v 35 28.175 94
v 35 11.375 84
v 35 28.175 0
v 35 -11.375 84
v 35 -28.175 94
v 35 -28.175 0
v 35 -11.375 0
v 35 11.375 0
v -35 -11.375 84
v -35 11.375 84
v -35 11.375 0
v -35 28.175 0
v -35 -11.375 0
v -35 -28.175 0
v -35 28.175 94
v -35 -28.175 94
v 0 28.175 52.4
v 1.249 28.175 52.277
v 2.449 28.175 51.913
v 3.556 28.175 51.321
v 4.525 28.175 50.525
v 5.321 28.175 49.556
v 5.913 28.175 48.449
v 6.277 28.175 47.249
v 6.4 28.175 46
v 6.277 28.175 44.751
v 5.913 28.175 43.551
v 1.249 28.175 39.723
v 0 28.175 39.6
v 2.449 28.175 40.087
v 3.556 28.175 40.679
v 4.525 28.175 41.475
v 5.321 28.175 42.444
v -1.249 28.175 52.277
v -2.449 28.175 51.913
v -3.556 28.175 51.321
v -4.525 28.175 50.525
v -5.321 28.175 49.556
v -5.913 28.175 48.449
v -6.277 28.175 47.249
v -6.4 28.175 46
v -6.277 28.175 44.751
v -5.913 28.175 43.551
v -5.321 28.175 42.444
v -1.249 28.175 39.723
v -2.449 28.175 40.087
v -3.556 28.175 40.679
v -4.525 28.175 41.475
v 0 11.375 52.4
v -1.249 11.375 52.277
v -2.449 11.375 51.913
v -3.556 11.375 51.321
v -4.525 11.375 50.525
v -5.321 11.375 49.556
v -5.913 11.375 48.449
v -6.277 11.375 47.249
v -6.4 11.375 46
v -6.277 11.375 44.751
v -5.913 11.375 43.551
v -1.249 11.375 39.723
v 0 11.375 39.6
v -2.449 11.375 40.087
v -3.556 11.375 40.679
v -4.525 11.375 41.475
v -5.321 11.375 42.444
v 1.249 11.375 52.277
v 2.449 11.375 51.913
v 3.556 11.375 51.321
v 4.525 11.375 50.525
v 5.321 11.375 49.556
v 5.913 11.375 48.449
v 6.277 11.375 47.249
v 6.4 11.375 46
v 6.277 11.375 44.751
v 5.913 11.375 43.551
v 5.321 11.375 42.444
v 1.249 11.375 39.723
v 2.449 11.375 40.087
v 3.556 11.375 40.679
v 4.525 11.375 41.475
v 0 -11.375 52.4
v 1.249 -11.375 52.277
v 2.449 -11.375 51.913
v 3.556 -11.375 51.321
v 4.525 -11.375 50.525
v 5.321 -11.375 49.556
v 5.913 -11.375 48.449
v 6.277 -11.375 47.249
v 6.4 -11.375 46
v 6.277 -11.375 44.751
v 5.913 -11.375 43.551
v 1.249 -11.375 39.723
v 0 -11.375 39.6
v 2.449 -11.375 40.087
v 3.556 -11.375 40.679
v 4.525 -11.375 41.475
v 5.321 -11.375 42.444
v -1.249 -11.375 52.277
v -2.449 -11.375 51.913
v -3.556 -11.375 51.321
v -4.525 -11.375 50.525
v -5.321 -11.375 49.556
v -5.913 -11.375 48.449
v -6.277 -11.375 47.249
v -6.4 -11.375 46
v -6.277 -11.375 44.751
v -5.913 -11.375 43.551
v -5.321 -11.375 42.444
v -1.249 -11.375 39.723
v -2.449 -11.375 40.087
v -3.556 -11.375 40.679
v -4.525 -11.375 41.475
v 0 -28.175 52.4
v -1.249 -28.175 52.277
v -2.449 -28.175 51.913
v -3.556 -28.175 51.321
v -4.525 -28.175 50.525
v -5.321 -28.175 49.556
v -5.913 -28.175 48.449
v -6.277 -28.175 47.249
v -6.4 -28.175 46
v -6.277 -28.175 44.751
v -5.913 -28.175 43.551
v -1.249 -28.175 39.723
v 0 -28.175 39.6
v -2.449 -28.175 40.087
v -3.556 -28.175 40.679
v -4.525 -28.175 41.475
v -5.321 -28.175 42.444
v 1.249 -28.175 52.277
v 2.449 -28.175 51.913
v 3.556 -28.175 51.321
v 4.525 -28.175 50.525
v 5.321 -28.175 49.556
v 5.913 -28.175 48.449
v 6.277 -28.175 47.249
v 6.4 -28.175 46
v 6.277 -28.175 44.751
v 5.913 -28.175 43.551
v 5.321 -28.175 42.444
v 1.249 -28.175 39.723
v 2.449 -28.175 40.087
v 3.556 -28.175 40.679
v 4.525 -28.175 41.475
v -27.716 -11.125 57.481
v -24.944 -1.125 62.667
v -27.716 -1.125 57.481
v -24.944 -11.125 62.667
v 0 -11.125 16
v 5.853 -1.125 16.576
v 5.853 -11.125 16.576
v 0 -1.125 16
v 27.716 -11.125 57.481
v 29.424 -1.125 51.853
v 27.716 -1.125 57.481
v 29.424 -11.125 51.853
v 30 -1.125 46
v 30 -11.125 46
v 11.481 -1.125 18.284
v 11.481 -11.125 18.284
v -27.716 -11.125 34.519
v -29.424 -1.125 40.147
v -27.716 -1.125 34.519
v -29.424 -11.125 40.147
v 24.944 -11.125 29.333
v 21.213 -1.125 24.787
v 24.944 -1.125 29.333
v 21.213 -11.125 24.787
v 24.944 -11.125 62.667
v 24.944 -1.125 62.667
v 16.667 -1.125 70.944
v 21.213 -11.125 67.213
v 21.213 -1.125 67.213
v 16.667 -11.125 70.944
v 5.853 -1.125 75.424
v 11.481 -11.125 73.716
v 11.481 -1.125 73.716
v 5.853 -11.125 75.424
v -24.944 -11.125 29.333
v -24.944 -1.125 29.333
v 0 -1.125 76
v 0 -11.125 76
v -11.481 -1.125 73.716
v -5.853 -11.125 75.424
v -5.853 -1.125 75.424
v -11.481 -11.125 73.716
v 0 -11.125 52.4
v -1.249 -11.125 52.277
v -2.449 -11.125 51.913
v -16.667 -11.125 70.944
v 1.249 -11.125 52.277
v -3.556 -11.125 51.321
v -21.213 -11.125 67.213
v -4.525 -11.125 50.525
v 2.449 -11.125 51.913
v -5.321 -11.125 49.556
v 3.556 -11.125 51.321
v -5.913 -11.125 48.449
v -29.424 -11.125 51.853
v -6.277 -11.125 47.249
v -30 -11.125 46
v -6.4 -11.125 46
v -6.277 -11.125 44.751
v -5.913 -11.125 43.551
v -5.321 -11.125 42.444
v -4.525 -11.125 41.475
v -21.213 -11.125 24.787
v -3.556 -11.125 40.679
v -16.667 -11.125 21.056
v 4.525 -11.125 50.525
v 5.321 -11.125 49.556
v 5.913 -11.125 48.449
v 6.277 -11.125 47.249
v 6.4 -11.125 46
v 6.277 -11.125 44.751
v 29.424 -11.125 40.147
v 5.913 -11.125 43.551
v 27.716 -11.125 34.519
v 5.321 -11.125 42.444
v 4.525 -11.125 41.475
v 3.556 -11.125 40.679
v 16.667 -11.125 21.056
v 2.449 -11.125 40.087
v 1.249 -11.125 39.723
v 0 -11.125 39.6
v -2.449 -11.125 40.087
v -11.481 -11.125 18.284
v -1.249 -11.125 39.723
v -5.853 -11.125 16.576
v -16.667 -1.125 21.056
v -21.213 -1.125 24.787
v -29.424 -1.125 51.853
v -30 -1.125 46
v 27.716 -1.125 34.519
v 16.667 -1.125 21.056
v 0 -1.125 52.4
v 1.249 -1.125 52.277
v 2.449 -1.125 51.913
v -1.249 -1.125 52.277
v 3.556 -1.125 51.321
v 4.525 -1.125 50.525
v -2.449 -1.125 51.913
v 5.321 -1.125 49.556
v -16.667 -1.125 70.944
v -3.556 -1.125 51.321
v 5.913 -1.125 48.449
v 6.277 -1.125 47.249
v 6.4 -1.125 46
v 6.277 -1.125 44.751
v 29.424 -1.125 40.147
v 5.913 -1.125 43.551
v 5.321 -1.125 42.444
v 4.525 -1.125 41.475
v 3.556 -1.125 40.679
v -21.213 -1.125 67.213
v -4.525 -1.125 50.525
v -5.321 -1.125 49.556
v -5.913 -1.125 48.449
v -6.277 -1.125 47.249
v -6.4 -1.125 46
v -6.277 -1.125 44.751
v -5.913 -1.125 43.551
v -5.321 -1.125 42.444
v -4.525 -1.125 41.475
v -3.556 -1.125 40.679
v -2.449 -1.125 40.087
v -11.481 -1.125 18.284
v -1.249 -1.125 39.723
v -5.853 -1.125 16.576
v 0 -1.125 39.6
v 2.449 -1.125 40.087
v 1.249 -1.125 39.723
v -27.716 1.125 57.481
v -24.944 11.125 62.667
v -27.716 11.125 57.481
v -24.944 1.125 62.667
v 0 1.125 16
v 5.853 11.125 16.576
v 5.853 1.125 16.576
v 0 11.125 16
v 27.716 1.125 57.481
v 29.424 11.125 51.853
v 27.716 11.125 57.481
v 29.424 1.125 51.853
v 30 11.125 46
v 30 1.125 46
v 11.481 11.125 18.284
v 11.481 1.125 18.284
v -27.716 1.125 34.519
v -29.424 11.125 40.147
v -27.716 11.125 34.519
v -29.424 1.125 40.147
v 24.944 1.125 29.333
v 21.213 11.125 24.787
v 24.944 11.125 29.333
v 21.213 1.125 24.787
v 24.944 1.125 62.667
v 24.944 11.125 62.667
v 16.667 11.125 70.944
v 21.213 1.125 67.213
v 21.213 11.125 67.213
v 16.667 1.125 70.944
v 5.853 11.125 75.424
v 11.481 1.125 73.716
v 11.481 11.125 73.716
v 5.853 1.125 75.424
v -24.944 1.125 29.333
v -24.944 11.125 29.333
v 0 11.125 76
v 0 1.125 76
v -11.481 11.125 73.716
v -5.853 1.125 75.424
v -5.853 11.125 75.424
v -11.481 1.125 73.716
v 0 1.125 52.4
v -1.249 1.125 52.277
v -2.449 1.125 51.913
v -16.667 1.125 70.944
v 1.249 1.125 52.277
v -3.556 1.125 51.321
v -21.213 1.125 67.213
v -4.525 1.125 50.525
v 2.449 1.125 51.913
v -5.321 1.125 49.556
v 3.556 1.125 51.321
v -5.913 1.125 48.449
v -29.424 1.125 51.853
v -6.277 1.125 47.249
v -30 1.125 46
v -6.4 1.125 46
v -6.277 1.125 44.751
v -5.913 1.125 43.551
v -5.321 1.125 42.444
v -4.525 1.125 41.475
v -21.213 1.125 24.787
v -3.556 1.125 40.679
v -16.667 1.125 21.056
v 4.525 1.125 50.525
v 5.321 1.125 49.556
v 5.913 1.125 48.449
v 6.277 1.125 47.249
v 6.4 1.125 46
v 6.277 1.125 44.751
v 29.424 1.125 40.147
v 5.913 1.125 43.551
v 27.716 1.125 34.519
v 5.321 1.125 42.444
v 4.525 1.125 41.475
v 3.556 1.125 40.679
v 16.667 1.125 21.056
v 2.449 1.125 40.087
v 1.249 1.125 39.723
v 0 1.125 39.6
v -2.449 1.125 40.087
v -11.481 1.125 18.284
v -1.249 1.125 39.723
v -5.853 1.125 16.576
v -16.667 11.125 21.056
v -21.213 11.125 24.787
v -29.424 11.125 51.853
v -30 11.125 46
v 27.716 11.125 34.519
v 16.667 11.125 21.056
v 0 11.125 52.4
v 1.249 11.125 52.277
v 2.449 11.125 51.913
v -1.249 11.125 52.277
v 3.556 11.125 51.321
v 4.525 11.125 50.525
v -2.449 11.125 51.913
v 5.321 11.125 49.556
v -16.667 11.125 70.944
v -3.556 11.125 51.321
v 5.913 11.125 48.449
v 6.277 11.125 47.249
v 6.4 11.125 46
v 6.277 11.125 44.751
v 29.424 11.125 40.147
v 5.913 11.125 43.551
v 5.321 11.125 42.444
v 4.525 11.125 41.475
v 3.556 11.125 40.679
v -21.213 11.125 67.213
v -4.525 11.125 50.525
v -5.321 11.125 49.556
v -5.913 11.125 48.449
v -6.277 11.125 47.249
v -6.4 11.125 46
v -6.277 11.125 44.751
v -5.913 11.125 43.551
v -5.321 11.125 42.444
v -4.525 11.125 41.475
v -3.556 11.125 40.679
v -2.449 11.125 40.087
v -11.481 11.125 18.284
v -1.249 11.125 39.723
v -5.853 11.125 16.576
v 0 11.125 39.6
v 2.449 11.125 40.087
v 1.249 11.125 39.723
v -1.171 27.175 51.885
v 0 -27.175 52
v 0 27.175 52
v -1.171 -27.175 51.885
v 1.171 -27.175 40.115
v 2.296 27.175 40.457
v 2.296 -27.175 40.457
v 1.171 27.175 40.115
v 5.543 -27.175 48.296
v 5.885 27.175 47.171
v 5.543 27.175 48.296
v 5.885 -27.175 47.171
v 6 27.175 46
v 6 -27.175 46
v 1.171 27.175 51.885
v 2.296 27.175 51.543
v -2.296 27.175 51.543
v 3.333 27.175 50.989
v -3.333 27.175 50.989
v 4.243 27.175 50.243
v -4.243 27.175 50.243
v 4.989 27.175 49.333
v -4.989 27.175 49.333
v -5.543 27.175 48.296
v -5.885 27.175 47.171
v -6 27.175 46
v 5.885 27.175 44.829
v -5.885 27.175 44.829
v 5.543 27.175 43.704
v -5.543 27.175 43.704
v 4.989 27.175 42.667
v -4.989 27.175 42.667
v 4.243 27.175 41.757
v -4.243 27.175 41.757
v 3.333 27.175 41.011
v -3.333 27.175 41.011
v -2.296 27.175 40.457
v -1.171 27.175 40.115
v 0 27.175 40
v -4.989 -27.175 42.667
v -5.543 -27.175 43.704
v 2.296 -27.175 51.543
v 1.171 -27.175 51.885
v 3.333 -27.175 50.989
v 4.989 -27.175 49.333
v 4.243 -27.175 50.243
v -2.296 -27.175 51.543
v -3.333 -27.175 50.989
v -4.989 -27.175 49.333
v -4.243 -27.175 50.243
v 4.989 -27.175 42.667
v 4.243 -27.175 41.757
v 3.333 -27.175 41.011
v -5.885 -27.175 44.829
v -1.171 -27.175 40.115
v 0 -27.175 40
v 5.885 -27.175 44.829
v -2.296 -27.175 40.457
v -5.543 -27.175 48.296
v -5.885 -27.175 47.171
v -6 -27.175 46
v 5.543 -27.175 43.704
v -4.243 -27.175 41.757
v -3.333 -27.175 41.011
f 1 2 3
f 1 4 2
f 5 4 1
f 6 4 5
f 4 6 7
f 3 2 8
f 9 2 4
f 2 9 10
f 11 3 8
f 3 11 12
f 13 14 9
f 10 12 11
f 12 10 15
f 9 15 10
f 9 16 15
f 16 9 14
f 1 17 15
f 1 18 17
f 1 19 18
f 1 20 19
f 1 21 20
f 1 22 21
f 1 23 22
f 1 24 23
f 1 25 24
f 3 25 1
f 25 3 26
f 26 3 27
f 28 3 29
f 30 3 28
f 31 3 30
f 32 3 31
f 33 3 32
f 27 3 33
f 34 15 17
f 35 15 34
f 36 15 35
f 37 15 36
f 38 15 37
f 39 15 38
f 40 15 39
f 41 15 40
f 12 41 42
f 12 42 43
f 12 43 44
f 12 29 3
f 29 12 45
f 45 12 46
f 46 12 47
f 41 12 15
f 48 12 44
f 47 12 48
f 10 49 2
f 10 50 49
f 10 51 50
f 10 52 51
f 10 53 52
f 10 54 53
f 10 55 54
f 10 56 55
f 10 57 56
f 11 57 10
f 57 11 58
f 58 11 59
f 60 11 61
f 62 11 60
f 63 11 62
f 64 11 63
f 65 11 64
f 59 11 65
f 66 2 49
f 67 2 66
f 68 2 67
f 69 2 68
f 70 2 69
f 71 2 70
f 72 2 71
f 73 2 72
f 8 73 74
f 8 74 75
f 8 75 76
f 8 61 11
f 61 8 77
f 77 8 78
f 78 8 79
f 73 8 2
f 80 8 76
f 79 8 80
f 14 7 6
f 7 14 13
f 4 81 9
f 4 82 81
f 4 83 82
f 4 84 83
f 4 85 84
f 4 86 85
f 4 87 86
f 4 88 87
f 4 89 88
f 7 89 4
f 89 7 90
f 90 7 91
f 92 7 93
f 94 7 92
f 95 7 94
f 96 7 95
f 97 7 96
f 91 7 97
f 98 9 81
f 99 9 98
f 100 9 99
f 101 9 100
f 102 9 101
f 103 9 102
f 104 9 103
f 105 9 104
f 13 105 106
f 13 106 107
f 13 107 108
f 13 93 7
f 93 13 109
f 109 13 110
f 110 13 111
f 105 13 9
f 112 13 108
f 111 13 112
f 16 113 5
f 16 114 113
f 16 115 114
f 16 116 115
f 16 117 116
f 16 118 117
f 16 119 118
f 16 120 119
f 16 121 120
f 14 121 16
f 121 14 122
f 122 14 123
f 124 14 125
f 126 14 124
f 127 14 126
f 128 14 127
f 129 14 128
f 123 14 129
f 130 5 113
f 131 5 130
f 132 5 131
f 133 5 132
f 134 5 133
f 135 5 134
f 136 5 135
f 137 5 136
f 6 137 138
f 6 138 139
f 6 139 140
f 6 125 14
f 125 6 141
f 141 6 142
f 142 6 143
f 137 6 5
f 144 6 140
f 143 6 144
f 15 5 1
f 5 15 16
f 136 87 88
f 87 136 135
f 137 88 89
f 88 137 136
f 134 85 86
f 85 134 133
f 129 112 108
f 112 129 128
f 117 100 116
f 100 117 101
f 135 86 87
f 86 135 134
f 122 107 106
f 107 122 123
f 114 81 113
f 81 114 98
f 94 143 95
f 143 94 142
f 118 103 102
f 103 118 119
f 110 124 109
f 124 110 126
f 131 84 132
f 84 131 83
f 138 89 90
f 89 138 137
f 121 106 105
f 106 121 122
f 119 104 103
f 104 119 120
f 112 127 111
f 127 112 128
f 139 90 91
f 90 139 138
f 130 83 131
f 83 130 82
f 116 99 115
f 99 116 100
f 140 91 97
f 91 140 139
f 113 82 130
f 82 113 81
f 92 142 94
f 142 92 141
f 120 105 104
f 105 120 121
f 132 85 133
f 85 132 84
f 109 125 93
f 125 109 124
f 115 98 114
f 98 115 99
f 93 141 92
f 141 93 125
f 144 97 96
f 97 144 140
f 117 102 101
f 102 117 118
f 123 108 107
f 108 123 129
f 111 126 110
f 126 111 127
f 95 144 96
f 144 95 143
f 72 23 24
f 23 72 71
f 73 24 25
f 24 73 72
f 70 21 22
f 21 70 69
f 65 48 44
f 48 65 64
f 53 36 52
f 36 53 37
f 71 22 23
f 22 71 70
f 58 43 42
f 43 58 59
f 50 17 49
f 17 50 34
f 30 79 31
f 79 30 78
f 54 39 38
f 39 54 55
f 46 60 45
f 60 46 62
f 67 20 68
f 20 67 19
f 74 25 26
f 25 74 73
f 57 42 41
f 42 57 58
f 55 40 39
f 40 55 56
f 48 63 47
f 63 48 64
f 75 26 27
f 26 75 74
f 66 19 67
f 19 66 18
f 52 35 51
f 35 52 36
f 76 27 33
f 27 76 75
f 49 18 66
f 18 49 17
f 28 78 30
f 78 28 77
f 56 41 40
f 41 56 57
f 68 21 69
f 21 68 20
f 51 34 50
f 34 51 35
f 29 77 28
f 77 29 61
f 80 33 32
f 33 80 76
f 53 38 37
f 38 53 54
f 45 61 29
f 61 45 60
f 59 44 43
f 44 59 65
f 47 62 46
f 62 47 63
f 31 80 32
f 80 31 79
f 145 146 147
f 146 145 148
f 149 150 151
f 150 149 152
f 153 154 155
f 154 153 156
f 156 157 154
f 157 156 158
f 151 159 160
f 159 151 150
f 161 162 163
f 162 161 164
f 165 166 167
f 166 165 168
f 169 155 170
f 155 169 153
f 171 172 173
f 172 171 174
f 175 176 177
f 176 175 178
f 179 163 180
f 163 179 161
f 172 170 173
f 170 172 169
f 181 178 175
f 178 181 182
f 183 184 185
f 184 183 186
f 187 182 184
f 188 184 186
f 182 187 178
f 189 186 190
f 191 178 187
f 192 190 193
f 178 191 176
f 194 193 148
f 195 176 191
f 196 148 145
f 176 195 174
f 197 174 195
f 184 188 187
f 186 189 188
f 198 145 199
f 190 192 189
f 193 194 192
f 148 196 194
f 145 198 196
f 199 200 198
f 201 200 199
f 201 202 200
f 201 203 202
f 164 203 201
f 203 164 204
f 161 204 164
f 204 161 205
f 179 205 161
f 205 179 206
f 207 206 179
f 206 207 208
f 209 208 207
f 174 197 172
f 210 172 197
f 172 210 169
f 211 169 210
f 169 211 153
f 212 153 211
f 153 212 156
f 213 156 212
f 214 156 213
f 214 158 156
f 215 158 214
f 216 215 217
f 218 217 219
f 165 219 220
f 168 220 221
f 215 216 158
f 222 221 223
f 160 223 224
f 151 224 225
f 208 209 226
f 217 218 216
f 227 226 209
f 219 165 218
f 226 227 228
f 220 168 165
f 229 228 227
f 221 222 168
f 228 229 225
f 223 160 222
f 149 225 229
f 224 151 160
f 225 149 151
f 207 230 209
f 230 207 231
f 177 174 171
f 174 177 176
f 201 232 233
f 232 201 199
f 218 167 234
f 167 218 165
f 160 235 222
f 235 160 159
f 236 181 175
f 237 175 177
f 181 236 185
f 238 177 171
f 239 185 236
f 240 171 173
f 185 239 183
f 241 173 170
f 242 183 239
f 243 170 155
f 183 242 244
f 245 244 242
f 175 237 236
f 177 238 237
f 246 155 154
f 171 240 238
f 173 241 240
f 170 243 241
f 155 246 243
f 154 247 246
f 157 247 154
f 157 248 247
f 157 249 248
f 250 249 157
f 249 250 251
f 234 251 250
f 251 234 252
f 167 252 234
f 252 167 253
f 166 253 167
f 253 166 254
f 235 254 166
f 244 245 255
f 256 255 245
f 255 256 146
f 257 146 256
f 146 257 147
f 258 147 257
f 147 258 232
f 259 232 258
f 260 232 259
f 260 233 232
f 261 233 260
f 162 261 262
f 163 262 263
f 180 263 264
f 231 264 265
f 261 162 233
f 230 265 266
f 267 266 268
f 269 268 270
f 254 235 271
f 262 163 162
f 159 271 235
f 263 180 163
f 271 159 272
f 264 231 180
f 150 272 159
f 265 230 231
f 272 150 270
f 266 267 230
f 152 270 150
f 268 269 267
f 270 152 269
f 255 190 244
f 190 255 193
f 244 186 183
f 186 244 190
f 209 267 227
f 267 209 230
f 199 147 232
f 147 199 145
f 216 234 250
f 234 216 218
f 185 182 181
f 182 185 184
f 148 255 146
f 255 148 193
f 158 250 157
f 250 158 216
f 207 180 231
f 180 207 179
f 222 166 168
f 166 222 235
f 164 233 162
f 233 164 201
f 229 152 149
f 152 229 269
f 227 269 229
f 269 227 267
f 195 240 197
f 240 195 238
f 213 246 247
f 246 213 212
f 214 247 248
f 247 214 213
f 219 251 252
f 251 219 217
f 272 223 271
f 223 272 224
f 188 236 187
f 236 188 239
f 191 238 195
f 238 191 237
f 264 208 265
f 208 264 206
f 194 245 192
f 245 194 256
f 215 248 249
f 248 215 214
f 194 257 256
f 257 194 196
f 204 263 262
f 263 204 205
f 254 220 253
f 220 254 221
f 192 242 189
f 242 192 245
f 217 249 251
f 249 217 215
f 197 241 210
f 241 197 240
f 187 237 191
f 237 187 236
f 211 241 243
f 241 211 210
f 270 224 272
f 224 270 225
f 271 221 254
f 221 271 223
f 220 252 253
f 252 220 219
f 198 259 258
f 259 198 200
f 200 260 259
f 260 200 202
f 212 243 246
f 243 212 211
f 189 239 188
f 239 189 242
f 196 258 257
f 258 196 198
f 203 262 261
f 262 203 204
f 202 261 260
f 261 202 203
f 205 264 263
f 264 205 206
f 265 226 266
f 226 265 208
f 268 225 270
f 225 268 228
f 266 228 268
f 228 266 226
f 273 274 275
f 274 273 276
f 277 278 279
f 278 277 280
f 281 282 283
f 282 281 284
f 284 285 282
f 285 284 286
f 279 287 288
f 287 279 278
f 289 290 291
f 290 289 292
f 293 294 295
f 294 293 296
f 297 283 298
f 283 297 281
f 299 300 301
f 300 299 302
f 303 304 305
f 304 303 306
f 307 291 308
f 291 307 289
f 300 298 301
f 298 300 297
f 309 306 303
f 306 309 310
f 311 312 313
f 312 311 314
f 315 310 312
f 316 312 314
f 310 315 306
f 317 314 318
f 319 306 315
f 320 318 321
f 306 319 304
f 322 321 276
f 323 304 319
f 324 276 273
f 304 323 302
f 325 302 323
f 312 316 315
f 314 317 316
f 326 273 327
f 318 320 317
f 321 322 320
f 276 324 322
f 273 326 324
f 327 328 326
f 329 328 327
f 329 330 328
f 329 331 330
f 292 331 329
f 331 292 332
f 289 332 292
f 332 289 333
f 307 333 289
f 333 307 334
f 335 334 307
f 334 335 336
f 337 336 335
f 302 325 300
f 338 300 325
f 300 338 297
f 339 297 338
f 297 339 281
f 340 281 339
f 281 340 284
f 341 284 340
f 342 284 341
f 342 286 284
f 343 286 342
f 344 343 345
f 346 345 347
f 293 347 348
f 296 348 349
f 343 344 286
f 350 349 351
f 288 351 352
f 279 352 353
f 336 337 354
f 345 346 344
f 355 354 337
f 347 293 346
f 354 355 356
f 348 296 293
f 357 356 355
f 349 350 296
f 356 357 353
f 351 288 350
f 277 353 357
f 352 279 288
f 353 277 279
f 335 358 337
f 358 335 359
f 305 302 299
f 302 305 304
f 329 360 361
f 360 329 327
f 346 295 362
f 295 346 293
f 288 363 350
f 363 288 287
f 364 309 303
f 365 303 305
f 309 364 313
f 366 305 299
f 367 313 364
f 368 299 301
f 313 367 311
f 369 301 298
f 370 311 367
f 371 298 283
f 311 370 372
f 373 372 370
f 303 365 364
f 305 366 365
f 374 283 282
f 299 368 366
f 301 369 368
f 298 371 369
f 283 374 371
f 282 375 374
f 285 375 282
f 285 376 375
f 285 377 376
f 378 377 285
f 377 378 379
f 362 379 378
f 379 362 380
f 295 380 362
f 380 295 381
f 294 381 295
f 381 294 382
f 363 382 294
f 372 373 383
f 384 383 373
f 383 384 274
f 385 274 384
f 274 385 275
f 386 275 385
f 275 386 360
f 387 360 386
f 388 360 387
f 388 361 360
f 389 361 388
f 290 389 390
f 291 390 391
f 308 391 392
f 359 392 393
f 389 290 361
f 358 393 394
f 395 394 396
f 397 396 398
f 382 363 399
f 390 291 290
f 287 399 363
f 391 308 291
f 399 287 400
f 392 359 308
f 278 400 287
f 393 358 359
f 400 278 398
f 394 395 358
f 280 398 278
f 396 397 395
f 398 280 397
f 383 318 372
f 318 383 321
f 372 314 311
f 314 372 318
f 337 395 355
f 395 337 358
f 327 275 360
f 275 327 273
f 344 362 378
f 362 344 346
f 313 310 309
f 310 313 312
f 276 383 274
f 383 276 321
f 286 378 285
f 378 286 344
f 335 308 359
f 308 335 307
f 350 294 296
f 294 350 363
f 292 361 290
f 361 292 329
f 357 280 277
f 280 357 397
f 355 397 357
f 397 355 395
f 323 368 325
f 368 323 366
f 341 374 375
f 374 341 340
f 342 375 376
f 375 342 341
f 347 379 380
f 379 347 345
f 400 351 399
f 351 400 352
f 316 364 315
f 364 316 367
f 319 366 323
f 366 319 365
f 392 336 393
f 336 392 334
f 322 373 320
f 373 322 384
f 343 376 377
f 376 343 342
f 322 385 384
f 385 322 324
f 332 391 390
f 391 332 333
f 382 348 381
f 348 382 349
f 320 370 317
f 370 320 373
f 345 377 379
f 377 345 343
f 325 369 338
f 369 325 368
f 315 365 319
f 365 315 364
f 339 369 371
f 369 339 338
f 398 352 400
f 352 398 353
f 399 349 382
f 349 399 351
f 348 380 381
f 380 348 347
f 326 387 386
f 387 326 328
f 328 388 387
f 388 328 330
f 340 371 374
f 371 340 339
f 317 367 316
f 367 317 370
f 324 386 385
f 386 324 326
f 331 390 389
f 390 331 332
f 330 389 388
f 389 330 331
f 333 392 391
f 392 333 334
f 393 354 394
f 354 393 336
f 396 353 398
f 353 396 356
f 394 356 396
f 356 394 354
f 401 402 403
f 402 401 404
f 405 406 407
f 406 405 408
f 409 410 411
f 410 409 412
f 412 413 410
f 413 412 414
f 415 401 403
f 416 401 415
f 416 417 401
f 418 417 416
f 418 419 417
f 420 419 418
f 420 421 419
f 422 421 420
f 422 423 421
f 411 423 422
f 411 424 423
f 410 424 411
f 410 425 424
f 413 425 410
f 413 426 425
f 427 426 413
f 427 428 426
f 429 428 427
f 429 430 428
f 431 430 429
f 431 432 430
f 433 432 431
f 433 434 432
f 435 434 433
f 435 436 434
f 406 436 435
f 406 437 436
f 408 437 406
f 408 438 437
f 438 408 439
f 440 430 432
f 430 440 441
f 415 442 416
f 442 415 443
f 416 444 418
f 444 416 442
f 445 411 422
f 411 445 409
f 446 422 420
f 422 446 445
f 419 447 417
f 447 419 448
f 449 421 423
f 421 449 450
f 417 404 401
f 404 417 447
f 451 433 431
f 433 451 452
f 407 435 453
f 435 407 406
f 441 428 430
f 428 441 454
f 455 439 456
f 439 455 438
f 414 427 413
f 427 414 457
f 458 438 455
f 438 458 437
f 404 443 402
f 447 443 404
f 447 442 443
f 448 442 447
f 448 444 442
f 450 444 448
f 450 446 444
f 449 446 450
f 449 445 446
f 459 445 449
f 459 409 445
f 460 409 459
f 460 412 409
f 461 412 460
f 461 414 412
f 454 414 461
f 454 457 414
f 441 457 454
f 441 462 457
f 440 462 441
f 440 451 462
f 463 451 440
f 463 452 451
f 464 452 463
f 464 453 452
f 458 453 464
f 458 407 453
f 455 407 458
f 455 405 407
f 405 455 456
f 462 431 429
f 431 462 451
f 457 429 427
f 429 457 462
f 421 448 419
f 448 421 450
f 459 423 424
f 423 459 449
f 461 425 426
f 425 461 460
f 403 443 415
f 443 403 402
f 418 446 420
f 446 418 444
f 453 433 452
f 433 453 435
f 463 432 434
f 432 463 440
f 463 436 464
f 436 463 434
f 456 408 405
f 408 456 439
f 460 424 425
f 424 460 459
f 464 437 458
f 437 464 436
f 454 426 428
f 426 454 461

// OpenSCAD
$fn = 32;

// ------------------------------------------------------------------------
// Trolley wheel set: wheels d60, fork 84 mm tall
// Every part is its own module, assembly() places every instance.
// ------------------------------------------------------------------------

// --- part 1 ---
module trolley_fork() {
  difference() {
    union() {
      translate([-35, 11.375, 0]) cube([70, 16.8, 84]);
      translate([-35, -28.175, 0]) cube([70, 16.8, 84]);
      translate([-35, -28.175, 84]) cube([70, 56.35, 10]);
    }
    translate([0, -19.775, 46]) rotate([90, 0, 0]) cylinder(h = 18.8, d = 12.8, center = true);
    translate([0, 19.775, 46]) rotate([90, 0, 0]) cylinder(h = 18.8, d = 12.8, center = true);
  }
}

// --- part 2 ---
module trolley_wheel() {
  difference() {
      translate([0, 0, 0]) cylinder(h = 10, d = 60);
      translate([0, 0, -1]) cylinder(h = 12, d = 12.8);
    }
}

// --- part 3 ---
module trolley_axle() {
  translate([0, 0, -27.175]) cylinder(h = 54.35, d = 12);
}

// --- assembly ---
module assembly() {
  color([0.80, 0.24, 0.20]) translate([0, 0, 0]) rotate([0, 0, 0]) trolley_fork();
  color([0.20, 0.45, 0.75]) translate([0, -1.125, 46]) rotate([90, 0, 0]) trolley_wheel();
  color([0.25, 0.62, 0.32]) translate([0, 11.125, 46]) rotate([90, 0, 0]) trolley_wheel();
  color([0.92, 0.70, 0.18]) translate([0, 0, 46]) rotate([90, 0, 0]) trolley_axle();
}

assembly();
